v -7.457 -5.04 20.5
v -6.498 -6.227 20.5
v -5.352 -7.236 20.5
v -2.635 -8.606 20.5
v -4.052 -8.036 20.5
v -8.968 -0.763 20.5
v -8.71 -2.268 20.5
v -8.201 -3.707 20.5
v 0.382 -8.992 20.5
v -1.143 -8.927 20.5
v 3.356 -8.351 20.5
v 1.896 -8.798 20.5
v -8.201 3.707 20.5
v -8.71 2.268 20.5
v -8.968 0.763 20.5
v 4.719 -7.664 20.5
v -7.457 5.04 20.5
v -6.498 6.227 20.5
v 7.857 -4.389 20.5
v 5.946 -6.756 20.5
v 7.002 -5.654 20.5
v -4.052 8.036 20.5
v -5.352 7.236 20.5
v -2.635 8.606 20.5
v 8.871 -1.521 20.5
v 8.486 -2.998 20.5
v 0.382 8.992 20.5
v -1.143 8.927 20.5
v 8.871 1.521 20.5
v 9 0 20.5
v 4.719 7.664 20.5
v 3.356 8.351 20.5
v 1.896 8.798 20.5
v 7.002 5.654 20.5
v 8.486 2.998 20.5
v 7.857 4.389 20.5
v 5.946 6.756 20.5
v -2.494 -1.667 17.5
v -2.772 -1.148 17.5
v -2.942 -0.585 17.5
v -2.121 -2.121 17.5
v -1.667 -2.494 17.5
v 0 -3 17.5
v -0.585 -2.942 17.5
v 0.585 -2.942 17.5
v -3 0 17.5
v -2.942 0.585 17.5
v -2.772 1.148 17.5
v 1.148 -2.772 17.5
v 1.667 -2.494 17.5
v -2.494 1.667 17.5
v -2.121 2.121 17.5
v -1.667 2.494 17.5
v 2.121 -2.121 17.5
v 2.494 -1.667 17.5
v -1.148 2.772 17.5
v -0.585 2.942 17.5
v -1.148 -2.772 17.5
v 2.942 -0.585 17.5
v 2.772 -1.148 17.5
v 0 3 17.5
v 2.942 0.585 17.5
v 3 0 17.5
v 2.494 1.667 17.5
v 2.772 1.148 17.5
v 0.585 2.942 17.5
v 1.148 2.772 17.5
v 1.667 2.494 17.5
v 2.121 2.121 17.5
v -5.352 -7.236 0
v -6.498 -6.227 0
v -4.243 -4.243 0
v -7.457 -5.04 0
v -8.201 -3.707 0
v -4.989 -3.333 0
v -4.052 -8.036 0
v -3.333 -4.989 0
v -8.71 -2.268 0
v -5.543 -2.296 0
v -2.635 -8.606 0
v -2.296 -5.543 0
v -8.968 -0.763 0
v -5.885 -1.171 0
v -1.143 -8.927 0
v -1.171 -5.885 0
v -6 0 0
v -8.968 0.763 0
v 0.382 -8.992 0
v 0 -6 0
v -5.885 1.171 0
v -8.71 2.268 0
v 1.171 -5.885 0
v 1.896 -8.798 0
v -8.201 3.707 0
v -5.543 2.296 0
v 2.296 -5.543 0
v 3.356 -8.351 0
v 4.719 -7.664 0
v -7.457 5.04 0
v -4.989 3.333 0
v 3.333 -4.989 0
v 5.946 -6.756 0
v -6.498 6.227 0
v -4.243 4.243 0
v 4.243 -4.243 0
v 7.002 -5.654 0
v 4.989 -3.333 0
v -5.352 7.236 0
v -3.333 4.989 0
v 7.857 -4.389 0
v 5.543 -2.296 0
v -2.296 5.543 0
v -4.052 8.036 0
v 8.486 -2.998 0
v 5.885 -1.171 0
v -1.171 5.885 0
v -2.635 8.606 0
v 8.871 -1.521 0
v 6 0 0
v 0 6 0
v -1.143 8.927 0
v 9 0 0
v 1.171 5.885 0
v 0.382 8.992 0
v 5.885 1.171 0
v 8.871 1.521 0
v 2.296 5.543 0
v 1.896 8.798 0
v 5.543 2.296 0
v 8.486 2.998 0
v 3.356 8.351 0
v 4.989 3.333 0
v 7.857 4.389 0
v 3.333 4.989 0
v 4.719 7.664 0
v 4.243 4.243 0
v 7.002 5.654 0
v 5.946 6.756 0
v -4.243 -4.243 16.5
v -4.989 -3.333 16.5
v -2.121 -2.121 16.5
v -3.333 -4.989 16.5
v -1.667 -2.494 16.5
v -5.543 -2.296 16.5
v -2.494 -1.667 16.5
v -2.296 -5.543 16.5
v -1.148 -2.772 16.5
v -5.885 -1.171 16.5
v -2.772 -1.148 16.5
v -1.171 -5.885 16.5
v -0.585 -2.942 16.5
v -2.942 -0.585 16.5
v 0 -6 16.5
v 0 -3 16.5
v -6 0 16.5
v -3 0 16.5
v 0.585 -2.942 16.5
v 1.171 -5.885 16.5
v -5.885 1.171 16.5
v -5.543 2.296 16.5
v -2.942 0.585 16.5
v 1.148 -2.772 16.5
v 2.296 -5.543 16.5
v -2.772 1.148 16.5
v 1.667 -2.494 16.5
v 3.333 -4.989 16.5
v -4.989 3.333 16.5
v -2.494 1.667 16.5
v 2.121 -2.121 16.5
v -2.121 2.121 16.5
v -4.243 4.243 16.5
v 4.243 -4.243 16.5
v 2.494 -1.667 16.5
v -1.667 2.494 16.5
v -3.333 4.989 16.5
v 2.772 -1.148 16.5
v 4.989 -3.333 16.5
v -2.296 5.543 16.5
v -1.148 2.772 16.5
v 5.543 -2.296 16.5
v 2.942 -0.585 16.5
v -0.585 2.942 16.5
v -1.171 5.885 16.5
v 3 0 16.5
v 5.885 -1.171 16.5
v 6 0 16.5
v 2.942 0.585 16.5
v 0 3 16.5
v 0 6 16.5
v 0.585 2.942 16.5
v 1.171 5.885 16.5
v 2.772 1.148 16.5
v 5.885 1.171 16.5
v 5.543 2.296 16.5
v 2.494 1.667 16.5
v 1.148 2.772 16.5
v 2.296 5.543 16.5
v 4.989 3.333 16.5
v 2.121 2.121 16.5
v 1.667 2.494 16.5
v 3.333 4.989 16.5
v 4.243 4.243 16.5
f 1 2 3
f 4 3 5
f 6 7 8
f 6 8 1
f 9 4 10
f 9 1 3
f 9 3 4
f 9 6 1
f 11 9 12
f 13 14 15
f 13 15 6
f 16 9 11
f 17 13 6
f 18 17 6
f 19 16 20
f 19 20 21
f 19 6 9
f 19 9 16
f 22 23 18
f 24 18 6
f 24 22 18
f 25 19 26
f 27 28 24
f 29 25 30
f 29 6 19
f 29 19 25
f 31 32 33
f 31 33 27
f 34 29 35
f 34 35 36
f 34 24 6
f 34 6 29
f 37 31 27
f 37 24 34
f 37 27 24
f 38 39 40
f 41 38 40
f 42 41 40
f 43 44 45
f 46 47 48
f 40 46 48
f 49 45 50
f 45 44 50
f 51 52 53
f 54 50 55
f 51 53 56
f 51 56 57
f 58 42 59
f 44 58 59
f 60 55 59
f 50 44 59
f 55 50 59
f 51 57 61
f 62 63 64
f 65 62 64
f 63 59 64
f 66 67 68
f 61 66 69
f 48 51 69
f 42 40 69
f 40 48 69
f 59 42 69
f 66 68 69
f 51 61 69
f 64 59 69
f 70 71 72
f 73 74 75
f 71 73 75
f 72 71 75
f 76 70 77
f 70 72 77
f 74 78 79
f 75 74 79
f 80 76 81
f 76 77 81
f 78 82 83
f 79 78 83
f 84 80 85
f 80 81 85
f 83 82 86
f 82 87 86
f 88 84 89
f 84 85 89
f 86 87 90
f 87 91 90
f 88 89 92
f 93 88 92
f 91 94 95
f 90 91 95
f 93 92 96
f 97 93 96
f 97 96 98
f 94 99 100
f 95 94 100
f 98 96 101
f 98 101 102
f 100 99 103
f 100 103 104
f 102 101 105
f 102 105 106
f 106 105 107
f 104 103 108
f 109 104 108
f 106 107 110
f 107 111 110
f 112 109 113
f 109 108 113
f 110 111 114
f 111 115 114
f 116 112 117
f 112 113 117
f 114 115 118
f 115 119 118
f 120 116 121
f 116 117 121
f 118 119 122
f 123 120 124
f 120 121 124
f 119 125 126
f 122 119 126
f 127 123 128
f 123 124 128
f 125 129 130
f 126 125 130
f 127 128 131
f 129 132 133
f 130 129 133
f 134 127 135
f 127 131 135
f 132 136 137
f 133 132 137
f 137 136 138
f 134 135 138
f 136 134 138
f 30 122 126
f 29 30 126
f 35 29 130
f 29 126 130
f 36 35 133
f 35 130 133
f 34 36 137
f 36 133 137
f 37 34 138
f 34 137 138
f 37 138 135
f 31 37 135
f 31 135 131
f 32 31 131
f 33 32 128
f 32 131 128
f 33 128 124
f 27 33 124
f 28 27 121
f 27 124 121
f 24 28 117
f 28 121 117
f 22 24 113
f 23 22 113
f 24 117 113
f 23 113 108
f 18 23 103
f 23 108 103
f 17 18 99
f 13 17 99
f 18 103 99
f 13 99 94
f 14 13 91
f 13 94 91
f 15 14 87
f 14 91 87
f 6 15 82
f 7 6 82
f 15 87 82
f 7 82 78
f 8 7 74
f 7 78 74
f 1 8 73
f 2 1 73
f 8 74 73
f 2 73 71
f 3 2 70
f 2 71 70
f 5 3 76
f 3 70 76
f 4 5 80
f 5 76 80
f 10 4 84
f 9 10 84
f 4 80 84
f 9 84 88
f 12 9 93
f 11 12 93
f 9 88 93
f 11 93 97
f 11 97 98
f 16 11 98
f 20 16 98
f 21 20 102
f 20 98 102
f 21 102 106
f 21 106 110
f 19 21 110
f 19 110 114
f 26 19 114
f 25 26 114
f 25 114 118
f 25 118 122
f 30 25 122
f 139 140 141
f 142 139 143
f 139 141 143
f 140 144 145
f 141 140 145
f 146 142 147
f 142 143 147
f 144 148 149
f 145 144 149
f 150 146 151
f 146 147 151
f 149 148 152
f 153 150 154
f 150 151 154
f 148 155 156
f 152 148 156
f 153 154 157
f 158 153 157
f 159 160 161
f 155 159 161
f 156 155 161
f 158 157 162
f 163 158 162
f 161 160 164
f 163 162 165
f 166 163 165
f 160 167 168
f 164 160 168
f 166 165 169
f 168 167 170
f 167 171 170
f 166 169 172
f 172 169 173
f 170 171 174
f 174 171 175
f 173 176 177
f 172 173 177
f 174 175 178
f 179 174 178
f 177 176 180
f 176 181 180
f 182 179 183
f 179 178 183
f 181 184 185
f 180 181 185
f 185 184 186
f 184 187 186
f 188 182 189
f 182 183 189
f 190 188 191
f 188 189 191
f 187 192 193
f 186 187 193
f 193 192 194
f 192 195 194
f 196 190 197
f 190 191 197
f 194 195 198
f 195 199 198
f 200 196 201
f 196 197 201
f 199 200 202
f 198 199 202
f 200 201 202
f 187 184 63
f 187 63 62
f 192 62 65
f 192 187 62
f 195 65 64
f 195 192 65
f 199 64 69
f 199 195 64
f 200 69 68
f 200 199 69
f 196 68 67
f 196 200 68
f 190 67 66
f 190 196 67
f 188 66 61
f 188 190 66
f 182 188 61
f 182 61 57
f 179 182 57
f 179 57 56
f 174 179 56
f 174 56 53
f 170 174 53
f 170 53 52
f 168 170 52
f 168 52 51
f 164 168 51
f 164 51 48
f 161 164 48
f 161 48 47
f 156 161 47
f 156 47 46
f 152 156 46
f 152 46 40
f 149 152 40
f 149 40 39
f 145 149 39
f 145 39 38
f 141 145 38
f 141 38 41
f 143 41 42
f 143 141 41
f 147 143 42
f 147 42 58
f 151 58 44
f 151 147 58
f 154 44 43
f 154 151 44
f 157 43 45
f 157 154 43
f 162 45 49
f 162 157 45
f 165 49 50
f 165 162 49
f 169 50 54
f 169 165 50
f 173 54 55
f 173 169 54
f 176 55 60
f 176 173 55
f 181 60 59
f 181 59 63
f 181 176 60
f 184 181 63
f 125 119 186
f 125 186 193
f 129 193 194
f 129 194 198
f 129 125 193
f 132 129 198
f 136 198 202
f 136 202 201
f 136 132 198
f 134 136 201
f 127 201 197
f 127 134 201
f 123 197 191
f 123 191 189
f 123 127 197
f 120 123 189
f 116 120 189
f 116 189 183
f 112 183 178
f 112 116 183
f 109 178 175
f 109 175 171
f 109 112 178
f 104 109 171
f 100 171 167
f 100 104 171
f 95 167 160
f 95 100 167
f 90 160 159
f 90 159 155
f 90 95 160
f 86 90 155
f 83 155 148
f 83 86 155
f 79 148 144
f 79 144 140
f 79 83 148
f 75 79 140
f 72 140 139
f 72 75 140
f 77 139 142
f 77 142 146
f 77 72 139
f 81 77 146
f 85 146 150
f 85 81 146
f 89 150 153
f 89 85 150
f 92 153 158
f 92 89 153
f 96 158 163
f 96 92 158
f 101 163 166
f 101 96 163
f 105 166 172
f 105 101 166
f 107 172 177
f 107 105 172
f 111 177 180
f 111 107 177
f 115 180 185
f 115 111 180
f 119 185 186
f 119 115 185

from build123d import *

# Parameters (mm, degrees)
F0_R     = 9
F1_DEPTH = 20.5
F2_R     = 6
F3_DEPTH = 16.5
F4_R     = 3
F5_DEPTH = 17.5


with BuildPart() as f1:
    # F0 (on Top) → F1 (new body)
    with BuildSketch(Plane.XY):
        Circle(F0_R)
    extrude(amount=F1_DEPTH)

    # F2 (on Top) → F3 (cut)
    with BuildSketch(Plane.XY):
        Circle(F2_R)
    extrude(amount=F3_DEPTH, mode=Mode.SUBTRACT)

    # F4 (on Top) → F5 (cut)
    with BuildSketch(Plane.XY):
        Circle(F4_R)
    extrude(amount=F5_DEPTH, mode=Mode.SUBTRACT)


solid = f1.part
